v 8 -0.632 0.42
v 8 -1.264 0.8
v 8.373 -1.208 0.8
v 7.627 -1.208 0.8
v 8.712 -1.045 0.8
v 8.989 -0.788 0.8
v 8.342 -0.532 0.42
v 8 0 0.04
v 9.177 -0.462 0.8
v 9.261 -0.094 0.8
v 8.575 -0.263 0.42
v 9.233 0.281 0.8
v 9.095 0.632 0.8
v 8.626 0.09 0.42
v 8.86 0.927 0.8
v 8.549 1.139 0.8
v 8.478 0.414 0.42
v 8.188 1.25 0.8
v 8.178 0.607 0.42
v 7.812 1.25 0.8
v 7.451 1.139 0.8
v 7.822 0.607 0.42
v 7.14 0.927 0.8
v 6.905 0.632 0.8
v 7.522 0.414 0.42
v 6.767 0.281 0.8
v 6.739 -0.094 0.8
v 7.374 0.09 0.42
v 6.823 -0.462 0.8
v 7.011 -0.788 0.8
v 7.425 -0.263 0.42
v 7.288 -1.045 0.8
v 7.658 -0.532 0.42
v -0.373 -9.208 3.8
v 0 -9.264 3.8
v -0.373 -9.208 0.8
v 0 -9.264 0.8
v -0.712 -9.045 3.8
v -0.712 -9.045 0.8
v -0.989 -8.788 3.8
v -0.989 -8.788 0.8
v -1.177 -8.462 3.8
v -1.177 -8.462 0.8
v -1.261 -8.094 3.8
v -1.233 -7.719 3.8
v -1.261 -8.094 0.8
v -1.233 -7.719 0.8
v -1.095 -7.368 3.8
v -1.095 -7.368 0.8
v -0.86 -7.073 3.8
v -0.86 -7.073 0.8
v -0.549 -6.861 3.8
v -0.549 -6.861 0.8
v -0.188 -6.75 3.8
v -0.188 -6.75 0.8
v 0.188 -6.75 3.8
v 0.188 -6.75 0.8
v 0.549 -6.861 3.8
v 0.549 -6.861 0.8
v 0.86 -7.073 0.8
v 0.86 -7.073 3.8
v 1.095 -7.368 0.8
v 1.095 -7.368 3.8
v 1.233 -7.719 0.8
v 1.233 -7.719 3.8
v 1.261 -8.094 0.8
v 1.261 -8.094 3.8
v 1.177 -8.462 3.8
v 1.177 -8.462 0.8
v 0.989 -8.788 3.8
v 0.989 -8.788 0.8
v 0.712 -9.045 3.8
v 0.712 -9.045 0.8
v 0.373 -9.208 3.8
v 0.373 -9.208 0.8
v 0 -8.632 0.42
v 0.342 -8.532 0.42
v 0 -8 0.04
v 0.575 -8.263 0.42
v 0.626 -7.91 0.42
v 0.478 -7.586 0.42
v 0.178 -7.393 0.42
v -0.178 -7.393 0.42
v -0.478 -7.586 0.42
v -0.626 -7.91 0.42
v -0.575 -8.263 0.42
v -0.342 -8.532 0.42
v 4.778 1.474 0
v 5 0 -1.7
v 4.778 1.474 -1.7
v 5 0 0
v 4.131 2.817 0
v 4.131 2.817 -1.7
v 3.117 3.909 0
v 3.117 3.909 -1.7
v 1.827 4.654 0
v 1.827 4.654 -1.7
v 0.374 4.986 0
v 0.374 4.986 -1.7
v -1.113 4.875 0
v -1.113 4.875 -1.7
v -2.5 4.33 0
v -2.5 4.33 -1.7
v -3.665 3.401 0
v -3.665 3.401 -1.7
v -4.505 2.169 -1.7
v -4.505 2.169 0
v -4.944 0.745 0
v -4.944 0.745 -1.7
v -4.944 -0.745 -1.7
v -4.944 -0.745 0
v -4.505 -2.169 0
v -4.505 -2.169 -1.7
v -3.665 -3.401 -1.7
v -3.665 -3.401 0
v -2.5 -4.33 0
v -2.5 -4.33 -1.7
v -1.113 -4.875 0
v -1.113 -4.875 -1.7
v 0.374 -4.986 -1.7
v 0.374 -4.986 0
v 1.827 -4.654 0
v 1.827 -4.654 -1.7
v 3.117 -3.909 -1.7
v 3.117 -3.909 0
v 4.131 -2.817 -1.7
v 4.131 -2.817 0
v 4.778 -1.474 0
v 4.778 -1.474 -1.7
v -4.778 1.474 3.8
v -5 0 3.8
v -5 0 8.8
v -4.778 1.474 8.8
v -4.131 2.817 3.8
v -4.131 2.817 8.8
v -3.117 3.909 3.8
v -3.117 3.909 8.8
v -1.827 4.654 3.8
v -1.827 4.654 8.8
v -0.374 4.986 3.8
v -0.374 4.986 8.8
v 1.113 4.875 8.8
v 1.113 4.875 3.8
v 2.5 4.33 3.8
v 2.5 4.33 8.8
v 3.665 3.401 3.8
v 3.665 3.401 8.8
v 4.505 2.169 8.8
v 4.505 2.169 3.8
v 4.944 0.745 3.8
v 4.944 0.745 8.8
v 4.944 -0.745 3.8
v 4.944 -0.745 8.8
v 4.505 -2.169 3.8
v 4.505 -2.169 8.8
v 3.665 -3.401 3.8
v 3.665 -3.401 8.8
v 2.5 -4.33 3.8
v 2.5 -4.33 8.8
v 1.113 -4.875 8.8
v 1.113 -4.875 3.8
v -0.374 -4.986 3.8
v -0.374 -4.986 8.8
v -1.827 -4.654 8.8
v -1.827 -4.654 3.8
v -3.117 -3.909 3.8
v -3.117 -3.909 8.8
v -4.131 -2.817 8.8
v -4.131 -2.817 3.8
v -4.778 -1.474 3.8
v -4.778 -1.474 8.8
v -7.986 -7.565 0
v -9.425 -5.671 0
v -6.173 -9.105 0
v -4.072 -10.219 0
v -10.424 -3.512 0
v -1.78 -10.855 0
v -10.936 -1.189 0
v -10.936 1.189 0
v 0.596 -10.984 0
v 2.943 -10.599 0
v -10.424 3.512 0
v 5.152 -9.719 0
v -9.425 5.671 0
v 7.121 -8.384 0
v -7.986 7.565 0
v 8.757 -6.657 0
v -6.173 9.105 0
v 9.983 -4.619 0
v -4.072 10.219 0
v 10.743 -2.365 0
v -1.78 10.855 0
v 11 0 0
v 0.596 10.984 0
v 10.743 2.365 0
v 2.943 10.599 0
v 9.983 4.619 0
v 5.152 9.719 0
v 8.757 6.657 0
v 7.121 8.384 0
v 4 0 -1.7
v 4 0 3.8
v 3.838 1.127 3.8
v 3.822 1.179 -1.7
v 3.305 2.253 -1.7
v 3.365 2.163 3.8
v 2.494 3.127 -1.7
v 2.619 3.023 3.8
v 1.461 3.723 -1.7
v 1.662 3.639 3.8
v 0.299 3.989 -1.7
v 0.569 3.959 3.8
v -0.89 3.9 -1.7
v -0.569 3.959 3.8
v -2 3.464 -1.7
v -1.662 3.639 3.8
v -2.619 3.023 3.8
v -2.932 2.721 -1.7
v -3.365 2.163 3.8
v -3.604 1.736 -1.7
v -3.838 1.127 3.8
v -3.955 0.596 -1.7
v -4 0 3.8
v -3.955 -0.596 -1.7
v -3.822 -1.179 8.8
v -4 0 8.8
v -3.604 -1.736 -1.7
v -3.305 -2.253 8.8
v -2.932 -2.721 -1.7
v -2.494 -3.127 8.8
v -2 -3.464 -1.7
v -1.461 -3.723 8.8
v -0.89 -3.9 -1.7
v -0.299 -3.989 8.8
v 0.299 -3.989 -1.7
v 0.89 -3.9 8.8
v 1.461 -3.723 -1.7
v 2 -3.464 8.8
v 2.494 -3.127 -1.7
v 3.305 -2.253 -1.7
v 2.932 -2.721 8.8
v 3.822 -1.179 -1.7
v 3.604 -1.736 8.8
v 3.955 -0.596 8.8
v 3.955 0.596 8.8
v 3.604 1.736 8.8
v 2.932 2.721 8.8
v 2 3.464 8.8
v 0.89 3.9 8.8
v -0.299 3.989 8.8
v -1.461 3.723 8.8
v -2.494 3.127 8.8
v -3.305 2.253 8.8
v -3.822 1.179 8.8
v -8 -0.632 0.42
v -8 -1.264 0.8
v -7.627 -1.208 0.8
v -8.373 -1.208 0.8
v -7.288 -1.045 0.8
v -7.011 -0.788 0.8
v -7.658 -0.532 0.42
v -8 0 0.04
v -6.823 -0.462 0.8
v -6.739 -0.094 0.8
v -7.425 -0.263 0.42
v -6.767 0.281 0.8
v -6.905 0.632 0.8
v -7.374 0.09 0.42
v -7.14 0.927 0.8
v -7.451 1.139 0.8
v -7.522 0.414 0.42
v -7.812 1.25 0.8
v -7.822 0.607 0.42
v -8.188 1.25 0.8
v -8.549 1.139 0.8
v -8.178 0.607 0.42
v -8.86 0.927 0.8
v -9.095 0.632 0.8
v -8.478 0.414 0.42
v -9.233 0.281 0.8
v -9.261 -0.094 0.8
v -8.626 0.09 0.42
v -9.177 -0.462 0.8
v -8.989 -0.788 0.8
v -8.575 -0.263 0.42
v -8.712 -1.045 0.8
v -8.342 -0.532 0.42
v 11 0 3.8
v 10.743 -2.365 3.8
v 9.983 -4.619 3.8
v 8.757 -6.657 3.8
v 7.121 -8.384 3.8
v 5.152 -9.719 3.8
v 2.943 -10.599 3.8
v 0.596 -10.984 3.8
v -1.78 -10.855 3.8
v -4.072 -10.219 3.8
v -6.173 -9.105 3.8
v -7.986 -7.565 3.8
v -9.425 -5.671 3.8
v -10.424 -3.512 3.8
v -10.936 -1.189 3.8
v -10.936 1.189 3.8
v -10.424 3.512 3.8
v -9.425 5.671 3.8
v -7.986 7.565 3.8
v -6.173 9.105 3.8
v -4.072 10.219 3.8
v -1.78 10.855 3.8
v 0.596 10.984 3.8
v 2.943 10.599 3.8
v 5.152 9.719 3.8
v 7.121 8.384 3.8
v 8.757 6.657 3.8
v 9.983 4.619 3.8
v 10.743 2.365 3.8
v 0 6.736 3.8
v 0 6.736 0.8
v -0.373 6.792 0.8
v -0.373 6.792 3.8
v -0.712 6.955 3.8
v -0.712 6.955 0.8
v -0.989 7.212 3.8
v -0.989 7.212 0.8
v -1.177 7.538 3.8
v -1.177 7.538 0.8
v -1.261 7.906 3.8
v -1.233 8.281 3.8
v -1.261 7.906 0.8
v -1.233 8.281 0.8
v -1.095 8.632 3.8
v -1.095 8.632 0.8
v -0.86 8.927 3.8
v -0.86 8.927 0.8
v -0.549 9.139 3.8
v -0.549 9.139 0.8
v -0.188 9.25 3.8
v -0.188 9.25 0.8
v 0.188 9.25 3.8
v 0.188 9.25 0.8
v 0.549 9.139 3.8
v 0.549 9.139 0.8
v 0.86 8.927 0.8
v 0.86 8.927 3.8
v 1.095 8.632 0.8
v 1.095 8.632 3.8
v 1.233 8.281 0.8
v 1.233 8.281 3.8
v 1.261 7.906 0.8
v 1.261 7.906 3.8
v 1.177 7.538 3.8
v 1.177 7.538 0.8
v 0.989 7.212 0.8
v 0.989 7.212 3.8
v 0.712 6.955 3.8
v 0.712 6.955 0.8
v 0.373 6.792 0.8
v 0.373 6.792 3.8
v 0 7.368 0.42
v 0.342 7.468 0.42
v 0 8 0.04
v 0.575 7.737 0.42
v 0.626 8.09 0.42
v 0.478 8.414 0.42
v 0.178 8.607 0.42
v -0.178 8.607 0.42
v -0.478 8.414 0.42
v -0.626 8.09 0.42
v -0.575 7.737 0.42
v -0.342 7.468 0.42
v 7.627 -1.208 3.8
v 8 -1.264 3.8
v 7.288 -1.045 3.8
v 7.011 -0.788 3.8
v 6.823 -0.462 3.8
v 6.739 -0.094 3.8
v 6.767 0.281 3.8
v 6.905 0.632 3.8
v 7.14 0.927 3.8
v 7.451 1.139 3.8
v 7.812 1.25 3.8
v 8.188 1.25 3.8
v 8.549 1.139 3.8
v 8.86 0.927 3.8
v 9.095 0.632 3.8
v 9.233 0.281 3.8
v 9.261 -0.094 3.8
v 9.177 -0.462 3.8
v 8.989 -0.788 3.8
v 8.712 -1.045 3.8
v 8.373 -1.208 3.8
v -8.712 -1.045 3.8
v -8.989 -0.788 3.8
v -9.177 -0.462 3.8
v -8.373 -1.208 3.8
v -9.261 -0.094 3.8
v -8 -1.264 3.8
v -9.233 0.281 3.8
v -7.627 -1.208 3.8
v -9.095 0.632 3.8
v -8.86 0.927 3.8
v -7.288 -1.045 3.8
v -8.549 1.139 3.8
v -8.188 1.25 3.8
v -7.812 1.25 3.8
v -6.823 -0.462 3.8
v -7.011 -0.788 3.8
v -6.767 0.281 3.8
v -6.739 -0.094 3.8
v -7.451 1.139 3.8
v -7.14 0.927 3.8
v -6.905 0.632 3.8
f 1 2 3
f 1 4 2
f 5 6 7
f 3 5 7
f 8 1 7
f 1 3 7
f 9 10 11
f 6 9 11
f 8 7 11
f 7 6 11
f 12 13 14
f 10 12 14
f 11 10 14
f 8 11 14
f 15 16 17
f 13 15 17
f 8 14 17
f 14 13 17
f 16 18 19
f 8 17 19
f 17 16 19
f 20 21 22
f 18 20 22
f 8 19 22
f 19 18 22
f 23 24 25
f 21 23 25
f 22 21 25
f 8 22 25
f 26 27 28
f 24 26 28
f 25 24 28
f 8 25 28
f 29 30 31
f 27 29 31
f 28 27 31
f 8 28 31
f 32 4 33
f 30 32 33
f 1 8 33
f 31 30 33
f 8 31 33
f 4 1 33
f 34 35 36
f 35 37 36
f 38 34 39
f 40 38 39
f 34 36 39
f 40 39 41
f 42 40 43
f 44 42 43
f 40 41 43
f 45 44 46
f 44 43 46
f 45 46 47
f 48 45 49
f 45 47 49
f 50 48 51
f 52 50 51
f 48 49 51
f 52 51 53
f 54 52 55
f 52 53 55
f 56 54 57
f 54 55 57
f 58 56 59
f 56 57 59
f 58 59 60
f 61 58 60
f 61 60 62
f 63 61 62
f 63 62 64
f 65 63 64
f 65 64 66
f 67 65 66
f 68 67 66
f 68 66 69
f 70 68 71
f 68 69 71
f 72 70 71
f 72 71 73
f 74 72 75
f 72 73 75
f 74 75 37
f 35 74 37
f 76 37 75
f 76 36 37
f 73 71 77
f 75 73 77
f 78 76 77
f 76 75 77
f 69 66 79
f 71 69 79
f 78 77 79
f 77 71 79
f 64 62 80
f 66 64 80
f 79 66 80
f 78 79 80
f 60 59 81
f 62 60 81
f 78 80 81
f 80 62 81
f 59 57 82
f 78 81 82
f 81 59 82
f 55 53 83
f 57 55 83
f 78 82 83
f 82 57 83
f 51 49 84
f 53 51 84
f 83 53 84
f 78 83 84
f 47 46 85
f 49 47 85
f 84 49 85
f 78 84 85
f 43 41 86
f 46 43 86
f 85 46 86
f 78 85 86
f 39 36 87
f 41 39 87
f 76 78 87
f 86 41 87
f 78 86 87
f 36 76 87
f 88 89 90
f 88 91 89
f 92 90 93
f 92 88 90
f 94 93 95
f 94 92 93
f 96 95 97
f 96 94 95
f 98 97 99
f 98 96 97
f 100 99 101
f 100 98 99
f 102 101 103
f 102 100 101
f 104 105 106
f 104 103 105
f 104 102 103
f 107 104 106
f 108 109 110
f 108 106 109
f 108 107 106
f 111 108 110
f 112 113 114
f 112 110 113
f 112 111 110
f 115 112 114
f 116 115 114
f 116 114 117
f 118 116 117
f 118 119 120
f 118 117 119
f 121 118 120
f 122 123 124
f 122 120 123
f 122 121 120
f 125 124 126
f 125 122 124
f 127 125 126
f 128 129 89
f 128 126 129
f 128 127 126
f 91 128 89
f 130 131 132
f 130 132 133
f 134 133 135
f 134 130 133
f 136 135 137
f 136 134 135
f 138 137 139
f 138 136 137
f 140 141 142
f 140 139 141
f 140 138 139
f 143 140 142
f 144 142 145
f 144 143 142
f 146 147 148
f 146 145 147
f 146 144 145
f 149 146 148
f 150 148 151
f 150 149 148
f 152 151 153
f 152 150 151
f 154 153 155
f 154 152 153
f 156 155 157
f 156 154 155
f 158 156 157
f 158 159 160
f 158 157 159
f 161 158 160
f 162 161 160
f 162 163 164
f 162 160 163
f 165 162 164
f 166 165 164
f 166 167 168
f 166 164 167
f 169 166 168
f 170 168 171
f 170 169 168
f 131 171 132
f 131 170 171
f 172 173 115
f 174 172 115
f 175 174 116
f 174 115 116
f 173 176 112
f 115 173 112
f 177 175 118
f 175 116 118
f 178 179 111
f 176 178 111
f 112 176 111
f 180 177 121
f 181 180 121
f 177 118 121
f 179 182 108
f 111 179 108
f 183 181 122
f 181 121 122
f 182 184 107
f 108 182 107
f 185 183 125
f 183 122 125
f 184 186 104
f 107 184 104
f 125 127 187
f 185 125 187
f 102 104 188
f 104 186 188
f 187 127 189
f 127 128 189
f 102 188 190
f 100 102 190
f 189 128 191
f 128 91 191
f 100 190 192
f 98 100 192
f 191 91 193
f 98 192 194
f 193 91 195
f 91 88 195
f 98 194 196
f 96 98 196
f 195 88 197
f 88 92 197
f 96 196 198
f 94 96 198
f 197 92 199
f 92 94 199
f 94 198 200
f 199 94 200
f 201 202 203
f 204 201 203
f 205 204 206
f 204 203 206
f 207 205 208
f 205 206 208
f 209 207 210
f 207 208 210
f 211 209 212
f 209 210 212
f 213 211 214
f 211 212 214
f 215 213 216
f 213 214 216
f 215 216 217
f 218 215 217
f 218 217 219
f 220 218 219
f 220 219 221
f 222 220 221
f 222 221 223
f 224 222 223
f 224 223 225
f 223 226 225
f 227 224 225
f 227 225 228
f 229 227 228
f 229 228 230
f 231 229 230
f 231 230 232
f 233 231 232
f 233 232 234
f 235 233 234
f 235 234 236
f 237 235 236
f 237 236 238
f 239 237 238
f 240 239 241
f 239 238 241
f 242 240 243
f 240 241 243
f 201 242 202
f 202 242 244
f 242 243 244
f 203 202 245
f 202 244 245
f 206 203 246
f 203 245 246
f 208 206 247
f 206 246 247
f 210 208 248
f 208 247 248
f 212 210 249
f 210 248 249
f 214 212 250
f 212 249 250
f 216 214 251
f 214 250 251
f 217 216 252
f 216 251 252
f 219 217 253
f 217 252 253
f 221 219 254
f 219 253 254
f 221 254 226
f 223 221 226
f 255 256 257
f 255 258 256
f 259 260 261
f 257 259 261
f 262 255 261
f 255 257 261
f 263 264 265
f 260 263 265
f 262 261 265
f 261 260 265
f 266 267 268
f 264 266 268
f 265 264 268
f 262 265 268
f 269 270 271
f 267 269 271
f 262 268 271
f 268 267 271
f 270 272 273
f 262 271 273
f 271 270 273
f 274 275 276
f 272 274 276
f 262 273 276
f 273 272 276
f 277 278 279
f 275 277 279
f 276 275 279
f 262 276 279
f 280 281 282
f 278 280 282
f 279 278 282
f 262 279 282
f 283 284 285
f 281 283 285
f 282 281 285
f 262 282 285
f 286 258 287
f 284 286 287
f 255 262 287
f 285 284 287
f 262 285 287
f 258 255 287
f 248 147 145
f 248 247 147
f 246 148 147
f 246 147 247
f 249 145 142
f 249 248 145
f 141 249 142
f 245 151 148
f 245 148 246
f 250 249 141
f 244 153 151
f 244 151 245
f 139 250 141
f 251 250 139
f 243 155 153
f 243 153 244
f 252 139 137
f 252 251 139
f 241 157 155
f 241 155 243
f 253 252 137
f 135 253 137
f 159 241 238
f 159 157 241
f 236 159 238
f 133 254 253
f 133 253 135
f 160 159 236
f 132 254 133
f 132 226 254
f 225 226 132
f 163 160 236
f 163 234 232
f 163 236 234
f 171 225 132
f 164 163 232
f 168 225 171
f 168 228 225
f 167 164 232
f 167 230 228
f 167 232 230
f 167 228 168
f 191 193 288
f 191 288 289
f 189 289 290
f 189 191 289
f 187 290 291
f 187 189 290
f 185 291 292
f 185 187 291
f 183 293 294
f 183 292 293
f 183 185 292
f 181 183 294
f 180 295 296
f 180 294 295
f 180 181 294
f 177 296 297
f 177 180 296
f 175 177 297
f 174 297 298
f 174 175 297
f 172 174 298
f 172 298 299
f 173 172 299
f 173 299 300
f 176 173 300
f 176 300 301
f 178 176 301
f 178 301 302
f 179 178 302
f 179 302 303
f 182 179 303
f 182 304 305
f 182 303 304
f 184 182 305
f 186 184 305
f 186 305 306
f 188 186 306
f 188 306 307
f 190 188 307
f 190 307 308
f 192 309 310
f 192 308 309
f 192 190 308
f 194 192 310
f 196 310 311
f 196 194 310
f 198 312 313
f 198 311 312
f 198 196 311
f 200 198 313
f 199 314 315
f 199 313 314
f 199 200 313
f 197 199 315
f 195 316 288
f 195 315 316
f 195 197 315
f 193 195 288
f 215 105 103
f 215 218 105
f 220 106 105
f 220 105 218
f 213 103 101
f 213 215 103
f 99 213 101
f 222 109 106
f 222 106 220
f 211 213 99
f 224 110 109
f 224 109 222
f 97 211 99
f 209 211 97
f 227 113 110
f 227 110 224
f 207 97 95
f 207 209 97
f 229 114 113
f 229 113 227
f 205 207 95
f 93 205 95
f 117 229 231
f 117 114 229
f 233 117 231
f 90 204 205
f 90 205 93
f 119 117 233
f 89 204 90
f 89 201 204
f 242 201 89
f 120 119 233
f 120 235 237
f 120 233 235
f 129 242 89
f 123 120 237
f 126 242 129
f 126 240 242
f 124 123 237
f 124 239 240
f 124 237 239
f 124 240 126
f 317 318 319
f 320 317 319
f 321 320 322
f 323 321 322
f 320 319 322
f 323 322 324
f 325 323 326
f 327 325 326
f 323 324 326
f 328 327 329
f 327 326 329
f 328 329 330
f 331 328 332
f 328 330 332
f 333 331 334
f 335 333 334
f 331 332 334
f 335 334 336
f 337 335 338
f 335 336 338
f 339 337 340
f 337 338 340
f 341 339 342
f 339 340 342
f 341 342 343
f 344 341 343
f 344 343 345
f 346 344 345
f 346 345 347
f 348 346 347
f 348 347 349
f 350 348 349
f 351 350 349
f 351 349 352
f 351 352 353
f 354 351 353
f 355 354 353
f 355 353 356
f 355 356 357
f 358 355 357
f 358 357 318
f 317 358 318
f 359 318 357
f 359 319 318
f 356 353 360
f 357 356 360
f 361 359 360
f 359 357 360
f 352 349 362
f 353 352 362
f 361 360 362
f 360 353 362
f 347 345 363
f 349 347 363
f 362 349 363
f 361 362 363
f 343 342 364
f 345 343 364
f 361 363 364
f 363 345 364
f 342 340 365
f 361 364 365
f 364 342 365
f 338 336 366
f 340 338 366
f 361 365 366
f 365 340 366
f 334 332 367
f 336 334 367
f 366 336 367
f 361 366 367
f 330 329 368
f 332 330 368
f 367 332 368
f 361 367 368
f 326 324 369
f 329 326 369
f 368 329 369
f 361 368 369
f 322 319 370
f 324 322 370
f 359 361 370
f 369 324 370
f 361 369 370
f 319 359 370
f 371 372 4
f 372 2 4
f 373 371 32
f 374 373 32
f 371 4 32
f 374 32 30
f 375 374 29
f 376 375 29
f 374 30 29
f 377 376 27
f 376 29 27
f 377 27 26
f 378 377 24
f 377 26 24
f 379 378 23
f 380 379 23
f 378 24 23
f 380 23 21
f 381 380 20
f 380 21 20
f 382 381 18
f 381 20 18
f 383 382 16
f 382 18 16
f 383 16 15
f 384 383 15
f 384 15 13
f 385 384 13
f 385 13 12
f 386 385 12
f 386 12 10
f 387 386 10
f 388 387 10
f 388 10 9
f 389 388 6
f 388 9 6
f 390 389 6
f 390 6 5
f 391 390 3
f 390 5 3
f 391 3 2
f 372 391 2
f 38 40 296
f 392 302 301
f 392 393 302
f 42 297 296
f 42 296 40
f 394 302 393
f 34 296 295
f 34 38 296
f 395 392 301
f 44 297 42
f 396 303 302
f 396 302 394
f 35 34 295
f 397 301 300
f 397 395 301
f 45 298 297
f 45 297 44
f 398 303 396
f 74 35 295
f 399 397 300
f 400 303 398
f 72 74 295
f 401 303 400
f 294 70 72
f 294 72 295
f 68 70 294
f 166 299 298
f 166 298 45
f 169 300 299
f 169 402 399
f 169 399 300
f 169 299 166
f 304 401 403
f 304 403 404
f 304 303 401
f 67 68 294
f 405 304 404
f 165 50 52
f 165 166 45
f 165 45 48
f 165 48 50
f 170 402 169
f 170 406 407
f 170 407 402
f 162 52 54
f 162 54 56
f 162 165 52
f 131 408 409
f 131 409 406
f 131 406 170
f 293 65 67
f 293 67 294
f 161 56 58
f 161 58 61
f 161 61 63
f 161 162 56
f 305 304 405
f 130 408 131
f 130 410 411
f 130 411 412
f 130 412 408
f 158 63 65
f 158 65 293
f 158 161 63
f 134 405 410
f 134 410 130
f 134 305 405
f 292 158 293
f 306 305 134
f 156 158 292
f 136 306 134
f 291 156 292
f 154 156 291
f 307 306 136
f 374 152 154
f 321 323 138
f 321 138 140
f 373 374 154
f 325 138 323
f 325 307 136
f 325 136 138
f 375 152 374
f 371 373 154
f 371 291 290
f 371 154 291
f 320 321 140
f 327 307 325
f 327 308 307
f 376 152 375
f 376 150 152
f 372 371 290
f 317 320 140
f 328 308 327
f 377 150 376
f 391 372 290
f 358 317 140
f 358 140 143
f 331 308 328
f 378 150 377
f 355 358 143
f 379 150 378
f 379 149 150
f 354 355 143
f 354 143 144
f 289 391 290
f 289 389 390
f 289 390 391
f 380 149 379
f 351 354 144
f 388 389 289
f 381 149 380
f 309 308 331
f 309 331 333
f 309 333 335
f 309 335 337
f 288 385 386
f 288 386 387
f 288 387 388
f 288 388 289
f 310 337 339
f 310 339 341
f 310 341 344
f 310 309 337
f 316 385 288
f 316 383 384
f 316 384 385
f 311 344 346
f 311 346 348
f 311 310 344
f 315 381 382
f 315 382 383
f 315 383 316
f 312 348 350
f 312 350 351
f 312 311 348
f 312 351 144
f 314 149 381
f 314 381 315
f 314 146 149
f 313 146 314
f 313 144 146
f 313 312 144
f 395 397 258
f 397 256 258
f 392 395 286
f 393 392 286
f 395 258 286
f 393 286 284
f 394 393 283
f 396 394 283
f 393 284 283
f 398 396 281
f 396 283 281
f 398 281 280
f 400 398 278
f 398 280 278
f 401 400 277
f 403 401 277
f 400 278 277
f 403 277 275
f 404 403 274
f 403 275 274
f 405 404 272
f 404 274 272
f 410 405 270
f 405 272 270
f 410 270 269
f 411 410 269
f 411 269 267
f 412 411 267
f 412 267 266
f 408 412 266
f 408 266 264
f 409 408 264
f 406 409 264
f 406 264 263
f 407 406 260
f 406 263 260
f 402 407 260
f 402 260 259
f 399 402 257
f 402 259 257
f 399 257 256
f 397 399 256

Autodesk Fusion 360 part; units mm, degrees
sketch "Sketch1" plane through (0, 0, 0) normal (0, 0, 1) x (1, 0, 0)
  circle A0 centre (0, 0) radius 11
  circle A1 centre (0, 0) radius 4
  dimension "d1_4" = 22
  dimension "d2_4" = 8
extrude "Extrude1" add sketch "Sketch1" along normal blind 3.8
sketch "Sketch2" plane through (0, 0, 3.8) normal (0, 0, 1) x (-1, 0, 0)
  circle A0 centre (0, 0) radius 4
  circle A1 centre (0, 0) radius 11
  circle A2 centre (0, 0) radius 5
  dimension "d5_1" = 10
extrude "Extrude2" add sketch "Sketch2" along normal blind 5 contours A2
sketch "Sketch3" plane through (0, 0, 0) normal (0, 0, -1) x (1, 0, 0)
  circle A0 centre (0, 0) radius 4
  circle A1 centre (0, 0) radius 11
  circle A2 centre (0, 0) radius 5
  dimension "d8_1" = 10
extrude "Extrude3" add sketch "Sketch3" along normal blind 1.7 contours A2
sketch "Sketch4" plane through (0, 0, 3.8) normal (0, 0, 1) x (-1, 0, 0)
  circle A0 centre (0, 0) radius 5
  circle A1 centre (0, 0) radius 11
  circle A2 centre (0, 0) radius 8 construction
  circle A3 centre (0, 8) radius 1.4
  line L0 (0, 0) -> (-15, 0) construction
  circle A4 centre (-8, 0) radius 1.4
  circle A5 centre (8, 0) radius 1.4
  circle A6 centre (0, -8) radius 1.4
  dimension "d11_1" = 16
  dimension "d12_1" = 2.8
  dimension "d13_1" = 2.8
  dimension "d14_1" = 2.8
  dimension "d15_1" = 2.8
hole "Hole1" at (8, 0, 3.8) at (0, 8, 3.8) at (0, -8, 3.8) at (-8, 0, 3.8) direction (0, 0, -1) diameter 2.529 depth 3 tip angle 118
thread "Thread2" thread offset 0 thread length 10
equation "d9_1 = 10.5 mm - 8.8 mm"
